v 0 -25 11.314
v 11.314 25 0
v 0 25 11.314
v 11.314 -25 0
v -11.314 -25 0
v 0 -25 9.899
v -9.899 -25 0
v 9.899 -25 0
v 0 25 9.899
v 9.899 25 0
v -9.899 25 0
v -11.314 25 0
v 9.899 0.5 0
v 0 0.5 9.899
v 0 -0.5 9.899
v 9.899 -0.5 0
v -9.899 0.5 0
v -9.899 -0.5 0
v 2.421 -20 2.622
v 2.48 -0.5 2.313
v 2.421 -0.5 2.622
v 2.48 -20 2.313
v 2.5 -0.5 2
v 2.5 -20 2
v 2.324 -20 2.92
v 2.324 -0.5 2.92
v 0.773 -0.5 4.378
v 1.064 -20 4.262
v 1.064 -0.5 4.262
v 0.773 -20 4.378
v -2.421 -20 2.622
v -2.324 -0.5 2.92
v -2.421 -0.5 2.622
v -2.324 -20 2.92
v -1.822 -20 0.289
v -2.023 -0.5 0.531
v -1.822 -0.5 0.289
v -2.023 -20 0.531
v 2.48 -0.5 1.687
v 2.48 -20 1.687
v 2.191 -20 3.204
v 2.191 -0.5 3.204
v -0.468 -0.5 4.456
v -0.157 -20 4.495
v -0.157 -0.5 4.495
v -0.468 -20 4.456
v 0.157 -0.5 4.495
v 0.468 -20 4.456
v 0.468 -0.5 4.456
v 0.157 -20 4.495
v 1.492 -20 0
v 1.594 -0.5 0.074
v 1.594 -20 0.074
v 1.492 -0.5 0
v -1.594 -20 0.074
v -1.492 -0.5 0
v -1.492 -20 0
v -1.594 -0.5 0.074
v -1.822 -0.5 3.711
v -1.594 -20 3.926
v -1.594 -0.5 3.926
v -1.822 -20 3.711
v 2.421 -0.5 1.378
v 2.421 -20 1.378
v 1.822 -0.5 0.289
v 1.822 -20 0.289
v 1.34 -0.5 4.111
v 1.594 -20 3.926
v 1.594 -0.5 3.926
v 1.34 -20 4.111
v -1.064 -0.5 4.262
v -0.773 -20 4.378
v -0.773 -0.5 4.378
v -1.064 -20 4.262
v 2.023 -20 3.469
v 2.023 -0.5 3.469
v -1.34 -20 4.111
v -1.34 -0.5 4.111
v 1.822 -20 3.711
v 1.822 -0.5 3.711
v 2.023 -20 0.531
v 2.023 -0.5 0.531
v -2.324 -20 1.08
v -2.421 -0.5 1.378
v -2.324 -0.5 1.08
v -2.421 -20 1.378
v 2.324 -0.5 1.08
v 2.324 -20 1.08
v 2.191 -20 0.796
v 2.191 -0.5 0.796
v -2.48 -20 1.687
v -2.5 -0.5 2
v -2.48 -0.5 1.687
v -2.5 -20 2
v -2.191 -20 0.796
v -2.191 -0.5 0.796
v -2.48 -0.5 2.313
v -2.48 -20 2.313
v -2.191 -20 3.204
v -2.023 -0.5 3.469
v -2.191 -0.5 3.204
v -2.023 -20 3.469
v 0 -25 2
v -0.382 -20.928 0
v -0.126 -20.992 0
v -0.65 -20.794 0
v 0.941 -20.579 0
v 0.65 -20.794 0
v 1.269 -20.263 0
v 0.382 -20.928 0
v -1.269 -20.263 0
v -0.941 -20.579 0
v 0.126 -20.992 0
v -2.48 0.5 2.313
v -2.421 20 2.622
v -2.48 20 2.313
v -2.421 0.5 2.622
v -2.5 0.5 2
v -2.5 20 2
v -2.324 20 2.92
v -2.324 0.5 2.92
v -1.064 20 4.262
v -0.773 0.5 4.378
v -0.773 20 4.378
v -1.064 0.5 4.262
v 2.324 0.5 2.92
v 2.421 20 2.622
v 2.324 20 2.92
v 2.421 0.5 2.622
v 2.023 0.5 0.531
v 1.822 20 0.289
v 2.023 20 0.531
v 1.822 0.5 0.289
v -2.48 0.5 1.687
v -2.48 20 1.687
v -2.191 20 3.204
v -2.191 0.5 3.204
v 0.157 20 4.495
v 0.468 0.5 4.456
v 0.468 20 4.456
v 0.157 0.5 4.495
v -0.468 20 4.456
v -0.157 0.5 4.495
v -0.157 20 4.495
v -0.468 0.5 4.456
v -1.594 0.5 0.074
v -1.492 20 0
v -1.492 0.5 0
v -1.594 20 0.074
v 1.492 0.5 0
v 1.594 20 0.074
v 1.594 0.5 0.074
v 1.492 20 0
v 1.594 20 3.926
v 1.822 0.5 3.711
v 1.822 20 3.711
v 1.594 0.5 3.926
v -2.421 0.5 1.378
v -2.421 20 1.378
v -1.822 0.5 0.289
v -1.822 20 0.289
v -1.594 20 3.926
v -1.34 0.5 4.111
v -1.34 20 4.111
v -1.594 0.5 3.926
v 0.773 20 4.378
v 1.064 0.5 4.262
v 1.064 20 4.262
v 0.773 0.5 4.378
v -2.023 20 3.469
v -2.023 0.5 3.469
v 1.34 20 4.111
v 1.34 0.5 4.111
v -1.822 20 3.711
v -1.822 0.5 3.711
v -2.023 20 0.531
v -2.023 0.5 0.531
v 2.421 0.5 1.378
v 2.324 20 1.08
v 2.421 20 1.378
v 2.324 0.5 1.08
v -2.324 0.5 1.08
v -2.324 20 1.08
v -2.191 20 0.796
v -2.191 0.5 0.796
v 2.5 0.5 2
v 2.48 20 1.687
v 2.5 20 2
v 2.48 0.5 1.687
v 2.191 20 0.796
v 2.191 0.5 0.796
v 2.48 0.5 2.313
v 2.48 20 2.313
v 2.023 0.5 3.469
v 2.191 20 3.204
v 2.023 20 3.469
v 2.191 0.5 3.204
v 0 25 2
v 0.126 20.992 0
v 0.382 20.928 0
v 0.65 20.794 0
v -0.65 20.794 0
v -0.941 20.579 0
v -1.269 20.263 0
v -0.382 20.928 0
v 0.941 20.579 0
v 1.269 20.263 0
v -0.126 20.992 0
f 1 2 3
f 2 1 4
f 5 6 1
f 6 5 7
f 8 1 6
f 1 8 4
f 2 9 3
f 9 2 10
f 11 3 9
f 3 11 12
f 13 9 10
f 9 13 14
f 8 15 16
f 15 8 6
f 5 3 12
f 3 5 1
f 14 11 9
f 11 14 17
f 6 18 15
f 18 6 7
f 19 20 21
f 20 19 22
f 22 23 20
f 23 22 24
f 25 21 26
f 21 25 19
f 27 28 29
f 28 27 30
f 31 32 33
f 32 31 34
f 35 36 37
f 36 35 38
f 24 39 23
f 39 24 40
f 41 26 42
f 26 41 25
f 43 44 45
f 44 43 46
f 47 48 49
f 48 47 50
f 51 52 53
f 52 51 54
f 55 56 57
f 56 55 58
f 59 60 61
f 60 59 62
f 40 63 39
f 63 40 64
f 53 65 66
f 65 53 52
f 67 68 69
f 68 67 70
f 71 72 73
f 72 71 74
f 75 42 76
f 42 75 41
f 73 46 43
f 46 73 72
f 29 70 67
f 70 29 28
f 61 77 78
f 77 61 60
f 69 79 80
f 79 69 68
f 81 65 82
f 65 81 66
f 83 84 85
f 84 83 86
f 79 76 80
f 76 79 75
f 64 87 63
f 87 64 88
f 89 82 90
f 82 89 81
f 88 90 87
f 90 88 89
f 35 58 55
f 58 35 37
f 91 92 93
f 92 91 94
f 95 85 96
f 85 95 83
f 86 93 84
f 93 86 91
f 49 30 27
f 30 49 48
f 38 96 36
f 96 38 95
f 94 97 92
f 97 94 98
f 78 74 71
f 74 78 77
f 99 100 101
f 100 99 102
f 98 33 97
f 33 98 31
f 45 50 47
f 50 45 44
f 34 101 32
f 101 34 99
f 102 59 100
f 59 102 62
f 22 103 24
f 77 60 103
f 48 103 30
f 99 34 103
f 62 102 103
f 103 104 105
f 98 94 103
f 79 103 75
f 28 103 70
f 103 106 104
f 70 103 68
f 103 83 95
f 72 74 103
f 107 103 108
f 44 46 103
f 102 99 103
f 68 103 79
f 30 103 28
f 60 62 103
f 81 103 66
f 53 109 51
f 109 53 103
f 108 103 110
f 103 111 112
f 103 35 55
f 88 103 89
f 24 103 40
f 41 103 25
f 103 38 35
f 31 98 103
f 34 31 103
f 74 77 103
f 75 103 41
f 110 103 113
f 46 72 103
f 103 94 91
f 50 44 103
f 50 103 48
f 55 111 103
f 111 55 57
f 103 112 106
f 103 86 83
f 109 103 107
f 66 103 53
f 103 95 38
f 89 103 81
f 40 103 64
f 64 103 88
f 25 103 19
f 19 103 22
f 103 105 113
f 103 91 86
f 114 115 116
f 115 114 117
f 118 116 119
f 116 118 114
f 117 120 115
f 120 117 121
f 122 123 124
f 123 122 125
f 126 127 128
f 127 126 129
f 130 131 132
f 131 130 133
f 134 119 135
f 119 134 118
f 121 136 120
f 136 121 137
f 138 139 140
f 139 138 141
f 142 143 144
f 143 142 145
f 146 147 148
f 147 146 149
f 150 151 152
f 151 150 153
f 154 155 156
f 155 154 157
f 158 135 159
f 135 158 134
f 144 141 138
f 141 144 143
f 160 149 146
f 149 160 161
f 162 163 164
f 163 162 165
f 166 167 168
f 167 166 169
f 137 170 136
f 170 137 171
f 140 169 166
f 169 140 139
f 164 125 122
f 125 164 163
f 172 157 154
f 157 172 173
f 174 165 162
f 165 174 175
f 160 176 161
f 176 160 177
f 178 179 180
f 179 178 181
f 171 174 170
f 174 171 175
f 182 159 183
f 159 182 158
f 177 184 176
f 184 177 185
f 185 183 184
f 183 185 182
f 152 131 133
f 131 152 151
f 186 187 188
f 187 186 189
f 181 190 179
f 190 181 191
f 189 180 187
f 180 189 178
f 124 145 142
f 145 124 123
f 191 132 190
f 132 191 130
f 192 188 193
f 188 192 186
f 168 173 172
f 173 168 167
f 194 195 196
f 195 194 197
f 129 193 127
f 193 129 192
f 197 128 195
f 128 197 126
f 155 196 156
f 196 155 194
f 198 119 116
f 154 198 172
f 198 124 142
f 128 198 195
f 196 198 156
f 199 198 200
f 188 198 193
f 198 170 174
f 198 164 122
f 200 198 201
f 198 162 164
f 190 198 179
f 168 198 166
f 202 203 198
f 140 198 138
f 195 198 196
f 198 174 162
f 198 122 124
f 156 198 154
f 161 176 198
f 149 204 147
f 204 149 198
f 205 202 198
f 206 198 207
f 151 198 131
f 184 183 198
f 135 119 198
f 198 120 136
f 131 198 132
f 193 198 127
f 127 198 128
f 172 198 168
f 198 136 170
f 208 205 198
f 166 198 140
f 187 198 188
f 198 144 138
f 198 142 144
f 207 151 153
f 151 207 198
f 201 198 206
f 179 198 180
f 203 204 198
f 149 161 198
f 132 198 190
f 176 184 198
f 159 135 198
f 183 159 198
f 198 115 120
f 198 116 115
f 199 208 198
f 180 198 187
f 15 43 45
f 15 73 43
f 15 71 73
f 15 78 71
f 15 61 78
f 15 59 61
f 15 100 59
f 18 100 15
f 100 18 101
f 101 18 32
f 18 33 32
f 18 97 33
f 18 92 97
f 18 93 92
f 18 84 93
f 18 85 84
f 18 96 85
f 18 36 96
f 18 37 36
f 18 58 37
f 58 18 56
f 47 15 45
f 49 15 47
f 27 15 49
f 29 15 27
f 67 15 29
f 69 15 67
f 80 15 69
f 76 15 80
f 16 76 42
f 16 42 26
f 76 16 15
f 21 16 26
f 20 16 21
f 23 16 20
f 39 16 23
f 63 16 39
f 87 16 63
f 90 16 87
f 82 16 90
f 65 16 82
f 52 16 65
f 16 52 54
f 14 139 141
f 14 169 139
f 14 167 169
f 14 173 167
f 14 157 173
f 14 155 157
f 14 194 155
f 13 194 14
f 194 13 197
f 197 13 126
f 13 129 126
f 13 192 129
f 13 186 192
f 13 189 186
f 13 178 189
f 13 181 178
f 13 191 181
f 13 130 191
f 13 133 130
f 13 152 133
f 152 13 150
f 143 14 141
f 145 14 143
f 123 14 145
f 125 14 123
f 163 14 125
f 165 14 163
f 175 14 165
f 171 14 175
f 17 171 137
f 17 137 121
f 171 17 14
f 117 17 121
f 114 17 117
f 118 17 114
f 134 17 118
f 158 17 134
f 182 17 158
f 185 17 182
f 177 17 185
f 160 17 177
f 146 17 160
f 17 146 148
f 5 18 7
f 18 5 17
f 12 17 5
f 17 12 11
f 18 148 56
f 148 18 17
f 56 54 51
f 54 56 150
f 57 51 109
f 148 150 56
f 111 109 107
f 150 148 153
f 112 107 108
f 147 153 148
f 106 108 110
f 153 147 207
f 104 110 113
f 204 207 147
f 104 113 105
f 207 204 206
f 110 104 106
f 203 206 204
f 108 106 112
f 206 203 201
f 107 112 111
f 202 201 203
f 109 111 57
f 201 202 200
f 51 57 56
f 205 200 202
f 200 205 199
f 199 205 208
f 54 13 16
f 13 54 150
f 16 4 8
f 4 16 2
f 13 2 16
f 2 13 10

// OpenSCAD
// Cardboard Box Stacker (Remixed in OpenSCAD for printability) 
// Original Design By UnleashSpirit and Wolfcraft In https://www.thingiverse.com/thing:3331874
// Redesign By Brian Khuu 2024 for easier printability and parametric capability

$fn=50;

stacker_thickness = 1;
stacker_flange = 15;
stacker_height = 50;

pole_dia = 5;

rotate([90,0,0])
intersection()
{
    union()
    {
        rotate([0,0,45])
        {
            translate([stacker_flange/2, stacker_thickness/2-1/2, 0])
                cube([stacker_thickness, stacker_flange+1, stacker_height], center=true);
            translate([stacker_thickness/2-1/2, stacker_flange/2, 0])
                cube([stacker_flange+1, stacker_thickness, stacker_height], center=true);
        }

        hull()
        rotate([0,0,45])
        {
            translate([stacker_flange/2, stacker_thickness/2-1/2, 0])
                cube([stacker_thickness, stacker_flange+1, 1], center=true);
            translate([stacker_thickness/2-1/2, stacker_flange/2, 0])
                cube([stacker_flange+1, stacker_thickness, 1], center=true);
        }

        translate([0,2,0])
        {
            cylinder(d=pole_dia, h=stacker_height/2-pole_dia);
            translate([0,0,stacker_height/2-pole_dia])
                cylinder(d1=pole_dia,d2=0, h=pole_dia);
        }

        rotate([0,180,0])
        translate([0,2,0])
        {
            cylinder(d=pole_dia, h=stacker_height/2-pole_dia);
            translate([0,0,stacker_height/2-pole_dia])
                cylinder(d1=pole_dia,d2=0, h=pole_dia);
        }
    }
    
   translate([0,stacker_flange/2,0])
    cube([stacker_flange*2,stacker_flange,stacker_height], center=true);
}
